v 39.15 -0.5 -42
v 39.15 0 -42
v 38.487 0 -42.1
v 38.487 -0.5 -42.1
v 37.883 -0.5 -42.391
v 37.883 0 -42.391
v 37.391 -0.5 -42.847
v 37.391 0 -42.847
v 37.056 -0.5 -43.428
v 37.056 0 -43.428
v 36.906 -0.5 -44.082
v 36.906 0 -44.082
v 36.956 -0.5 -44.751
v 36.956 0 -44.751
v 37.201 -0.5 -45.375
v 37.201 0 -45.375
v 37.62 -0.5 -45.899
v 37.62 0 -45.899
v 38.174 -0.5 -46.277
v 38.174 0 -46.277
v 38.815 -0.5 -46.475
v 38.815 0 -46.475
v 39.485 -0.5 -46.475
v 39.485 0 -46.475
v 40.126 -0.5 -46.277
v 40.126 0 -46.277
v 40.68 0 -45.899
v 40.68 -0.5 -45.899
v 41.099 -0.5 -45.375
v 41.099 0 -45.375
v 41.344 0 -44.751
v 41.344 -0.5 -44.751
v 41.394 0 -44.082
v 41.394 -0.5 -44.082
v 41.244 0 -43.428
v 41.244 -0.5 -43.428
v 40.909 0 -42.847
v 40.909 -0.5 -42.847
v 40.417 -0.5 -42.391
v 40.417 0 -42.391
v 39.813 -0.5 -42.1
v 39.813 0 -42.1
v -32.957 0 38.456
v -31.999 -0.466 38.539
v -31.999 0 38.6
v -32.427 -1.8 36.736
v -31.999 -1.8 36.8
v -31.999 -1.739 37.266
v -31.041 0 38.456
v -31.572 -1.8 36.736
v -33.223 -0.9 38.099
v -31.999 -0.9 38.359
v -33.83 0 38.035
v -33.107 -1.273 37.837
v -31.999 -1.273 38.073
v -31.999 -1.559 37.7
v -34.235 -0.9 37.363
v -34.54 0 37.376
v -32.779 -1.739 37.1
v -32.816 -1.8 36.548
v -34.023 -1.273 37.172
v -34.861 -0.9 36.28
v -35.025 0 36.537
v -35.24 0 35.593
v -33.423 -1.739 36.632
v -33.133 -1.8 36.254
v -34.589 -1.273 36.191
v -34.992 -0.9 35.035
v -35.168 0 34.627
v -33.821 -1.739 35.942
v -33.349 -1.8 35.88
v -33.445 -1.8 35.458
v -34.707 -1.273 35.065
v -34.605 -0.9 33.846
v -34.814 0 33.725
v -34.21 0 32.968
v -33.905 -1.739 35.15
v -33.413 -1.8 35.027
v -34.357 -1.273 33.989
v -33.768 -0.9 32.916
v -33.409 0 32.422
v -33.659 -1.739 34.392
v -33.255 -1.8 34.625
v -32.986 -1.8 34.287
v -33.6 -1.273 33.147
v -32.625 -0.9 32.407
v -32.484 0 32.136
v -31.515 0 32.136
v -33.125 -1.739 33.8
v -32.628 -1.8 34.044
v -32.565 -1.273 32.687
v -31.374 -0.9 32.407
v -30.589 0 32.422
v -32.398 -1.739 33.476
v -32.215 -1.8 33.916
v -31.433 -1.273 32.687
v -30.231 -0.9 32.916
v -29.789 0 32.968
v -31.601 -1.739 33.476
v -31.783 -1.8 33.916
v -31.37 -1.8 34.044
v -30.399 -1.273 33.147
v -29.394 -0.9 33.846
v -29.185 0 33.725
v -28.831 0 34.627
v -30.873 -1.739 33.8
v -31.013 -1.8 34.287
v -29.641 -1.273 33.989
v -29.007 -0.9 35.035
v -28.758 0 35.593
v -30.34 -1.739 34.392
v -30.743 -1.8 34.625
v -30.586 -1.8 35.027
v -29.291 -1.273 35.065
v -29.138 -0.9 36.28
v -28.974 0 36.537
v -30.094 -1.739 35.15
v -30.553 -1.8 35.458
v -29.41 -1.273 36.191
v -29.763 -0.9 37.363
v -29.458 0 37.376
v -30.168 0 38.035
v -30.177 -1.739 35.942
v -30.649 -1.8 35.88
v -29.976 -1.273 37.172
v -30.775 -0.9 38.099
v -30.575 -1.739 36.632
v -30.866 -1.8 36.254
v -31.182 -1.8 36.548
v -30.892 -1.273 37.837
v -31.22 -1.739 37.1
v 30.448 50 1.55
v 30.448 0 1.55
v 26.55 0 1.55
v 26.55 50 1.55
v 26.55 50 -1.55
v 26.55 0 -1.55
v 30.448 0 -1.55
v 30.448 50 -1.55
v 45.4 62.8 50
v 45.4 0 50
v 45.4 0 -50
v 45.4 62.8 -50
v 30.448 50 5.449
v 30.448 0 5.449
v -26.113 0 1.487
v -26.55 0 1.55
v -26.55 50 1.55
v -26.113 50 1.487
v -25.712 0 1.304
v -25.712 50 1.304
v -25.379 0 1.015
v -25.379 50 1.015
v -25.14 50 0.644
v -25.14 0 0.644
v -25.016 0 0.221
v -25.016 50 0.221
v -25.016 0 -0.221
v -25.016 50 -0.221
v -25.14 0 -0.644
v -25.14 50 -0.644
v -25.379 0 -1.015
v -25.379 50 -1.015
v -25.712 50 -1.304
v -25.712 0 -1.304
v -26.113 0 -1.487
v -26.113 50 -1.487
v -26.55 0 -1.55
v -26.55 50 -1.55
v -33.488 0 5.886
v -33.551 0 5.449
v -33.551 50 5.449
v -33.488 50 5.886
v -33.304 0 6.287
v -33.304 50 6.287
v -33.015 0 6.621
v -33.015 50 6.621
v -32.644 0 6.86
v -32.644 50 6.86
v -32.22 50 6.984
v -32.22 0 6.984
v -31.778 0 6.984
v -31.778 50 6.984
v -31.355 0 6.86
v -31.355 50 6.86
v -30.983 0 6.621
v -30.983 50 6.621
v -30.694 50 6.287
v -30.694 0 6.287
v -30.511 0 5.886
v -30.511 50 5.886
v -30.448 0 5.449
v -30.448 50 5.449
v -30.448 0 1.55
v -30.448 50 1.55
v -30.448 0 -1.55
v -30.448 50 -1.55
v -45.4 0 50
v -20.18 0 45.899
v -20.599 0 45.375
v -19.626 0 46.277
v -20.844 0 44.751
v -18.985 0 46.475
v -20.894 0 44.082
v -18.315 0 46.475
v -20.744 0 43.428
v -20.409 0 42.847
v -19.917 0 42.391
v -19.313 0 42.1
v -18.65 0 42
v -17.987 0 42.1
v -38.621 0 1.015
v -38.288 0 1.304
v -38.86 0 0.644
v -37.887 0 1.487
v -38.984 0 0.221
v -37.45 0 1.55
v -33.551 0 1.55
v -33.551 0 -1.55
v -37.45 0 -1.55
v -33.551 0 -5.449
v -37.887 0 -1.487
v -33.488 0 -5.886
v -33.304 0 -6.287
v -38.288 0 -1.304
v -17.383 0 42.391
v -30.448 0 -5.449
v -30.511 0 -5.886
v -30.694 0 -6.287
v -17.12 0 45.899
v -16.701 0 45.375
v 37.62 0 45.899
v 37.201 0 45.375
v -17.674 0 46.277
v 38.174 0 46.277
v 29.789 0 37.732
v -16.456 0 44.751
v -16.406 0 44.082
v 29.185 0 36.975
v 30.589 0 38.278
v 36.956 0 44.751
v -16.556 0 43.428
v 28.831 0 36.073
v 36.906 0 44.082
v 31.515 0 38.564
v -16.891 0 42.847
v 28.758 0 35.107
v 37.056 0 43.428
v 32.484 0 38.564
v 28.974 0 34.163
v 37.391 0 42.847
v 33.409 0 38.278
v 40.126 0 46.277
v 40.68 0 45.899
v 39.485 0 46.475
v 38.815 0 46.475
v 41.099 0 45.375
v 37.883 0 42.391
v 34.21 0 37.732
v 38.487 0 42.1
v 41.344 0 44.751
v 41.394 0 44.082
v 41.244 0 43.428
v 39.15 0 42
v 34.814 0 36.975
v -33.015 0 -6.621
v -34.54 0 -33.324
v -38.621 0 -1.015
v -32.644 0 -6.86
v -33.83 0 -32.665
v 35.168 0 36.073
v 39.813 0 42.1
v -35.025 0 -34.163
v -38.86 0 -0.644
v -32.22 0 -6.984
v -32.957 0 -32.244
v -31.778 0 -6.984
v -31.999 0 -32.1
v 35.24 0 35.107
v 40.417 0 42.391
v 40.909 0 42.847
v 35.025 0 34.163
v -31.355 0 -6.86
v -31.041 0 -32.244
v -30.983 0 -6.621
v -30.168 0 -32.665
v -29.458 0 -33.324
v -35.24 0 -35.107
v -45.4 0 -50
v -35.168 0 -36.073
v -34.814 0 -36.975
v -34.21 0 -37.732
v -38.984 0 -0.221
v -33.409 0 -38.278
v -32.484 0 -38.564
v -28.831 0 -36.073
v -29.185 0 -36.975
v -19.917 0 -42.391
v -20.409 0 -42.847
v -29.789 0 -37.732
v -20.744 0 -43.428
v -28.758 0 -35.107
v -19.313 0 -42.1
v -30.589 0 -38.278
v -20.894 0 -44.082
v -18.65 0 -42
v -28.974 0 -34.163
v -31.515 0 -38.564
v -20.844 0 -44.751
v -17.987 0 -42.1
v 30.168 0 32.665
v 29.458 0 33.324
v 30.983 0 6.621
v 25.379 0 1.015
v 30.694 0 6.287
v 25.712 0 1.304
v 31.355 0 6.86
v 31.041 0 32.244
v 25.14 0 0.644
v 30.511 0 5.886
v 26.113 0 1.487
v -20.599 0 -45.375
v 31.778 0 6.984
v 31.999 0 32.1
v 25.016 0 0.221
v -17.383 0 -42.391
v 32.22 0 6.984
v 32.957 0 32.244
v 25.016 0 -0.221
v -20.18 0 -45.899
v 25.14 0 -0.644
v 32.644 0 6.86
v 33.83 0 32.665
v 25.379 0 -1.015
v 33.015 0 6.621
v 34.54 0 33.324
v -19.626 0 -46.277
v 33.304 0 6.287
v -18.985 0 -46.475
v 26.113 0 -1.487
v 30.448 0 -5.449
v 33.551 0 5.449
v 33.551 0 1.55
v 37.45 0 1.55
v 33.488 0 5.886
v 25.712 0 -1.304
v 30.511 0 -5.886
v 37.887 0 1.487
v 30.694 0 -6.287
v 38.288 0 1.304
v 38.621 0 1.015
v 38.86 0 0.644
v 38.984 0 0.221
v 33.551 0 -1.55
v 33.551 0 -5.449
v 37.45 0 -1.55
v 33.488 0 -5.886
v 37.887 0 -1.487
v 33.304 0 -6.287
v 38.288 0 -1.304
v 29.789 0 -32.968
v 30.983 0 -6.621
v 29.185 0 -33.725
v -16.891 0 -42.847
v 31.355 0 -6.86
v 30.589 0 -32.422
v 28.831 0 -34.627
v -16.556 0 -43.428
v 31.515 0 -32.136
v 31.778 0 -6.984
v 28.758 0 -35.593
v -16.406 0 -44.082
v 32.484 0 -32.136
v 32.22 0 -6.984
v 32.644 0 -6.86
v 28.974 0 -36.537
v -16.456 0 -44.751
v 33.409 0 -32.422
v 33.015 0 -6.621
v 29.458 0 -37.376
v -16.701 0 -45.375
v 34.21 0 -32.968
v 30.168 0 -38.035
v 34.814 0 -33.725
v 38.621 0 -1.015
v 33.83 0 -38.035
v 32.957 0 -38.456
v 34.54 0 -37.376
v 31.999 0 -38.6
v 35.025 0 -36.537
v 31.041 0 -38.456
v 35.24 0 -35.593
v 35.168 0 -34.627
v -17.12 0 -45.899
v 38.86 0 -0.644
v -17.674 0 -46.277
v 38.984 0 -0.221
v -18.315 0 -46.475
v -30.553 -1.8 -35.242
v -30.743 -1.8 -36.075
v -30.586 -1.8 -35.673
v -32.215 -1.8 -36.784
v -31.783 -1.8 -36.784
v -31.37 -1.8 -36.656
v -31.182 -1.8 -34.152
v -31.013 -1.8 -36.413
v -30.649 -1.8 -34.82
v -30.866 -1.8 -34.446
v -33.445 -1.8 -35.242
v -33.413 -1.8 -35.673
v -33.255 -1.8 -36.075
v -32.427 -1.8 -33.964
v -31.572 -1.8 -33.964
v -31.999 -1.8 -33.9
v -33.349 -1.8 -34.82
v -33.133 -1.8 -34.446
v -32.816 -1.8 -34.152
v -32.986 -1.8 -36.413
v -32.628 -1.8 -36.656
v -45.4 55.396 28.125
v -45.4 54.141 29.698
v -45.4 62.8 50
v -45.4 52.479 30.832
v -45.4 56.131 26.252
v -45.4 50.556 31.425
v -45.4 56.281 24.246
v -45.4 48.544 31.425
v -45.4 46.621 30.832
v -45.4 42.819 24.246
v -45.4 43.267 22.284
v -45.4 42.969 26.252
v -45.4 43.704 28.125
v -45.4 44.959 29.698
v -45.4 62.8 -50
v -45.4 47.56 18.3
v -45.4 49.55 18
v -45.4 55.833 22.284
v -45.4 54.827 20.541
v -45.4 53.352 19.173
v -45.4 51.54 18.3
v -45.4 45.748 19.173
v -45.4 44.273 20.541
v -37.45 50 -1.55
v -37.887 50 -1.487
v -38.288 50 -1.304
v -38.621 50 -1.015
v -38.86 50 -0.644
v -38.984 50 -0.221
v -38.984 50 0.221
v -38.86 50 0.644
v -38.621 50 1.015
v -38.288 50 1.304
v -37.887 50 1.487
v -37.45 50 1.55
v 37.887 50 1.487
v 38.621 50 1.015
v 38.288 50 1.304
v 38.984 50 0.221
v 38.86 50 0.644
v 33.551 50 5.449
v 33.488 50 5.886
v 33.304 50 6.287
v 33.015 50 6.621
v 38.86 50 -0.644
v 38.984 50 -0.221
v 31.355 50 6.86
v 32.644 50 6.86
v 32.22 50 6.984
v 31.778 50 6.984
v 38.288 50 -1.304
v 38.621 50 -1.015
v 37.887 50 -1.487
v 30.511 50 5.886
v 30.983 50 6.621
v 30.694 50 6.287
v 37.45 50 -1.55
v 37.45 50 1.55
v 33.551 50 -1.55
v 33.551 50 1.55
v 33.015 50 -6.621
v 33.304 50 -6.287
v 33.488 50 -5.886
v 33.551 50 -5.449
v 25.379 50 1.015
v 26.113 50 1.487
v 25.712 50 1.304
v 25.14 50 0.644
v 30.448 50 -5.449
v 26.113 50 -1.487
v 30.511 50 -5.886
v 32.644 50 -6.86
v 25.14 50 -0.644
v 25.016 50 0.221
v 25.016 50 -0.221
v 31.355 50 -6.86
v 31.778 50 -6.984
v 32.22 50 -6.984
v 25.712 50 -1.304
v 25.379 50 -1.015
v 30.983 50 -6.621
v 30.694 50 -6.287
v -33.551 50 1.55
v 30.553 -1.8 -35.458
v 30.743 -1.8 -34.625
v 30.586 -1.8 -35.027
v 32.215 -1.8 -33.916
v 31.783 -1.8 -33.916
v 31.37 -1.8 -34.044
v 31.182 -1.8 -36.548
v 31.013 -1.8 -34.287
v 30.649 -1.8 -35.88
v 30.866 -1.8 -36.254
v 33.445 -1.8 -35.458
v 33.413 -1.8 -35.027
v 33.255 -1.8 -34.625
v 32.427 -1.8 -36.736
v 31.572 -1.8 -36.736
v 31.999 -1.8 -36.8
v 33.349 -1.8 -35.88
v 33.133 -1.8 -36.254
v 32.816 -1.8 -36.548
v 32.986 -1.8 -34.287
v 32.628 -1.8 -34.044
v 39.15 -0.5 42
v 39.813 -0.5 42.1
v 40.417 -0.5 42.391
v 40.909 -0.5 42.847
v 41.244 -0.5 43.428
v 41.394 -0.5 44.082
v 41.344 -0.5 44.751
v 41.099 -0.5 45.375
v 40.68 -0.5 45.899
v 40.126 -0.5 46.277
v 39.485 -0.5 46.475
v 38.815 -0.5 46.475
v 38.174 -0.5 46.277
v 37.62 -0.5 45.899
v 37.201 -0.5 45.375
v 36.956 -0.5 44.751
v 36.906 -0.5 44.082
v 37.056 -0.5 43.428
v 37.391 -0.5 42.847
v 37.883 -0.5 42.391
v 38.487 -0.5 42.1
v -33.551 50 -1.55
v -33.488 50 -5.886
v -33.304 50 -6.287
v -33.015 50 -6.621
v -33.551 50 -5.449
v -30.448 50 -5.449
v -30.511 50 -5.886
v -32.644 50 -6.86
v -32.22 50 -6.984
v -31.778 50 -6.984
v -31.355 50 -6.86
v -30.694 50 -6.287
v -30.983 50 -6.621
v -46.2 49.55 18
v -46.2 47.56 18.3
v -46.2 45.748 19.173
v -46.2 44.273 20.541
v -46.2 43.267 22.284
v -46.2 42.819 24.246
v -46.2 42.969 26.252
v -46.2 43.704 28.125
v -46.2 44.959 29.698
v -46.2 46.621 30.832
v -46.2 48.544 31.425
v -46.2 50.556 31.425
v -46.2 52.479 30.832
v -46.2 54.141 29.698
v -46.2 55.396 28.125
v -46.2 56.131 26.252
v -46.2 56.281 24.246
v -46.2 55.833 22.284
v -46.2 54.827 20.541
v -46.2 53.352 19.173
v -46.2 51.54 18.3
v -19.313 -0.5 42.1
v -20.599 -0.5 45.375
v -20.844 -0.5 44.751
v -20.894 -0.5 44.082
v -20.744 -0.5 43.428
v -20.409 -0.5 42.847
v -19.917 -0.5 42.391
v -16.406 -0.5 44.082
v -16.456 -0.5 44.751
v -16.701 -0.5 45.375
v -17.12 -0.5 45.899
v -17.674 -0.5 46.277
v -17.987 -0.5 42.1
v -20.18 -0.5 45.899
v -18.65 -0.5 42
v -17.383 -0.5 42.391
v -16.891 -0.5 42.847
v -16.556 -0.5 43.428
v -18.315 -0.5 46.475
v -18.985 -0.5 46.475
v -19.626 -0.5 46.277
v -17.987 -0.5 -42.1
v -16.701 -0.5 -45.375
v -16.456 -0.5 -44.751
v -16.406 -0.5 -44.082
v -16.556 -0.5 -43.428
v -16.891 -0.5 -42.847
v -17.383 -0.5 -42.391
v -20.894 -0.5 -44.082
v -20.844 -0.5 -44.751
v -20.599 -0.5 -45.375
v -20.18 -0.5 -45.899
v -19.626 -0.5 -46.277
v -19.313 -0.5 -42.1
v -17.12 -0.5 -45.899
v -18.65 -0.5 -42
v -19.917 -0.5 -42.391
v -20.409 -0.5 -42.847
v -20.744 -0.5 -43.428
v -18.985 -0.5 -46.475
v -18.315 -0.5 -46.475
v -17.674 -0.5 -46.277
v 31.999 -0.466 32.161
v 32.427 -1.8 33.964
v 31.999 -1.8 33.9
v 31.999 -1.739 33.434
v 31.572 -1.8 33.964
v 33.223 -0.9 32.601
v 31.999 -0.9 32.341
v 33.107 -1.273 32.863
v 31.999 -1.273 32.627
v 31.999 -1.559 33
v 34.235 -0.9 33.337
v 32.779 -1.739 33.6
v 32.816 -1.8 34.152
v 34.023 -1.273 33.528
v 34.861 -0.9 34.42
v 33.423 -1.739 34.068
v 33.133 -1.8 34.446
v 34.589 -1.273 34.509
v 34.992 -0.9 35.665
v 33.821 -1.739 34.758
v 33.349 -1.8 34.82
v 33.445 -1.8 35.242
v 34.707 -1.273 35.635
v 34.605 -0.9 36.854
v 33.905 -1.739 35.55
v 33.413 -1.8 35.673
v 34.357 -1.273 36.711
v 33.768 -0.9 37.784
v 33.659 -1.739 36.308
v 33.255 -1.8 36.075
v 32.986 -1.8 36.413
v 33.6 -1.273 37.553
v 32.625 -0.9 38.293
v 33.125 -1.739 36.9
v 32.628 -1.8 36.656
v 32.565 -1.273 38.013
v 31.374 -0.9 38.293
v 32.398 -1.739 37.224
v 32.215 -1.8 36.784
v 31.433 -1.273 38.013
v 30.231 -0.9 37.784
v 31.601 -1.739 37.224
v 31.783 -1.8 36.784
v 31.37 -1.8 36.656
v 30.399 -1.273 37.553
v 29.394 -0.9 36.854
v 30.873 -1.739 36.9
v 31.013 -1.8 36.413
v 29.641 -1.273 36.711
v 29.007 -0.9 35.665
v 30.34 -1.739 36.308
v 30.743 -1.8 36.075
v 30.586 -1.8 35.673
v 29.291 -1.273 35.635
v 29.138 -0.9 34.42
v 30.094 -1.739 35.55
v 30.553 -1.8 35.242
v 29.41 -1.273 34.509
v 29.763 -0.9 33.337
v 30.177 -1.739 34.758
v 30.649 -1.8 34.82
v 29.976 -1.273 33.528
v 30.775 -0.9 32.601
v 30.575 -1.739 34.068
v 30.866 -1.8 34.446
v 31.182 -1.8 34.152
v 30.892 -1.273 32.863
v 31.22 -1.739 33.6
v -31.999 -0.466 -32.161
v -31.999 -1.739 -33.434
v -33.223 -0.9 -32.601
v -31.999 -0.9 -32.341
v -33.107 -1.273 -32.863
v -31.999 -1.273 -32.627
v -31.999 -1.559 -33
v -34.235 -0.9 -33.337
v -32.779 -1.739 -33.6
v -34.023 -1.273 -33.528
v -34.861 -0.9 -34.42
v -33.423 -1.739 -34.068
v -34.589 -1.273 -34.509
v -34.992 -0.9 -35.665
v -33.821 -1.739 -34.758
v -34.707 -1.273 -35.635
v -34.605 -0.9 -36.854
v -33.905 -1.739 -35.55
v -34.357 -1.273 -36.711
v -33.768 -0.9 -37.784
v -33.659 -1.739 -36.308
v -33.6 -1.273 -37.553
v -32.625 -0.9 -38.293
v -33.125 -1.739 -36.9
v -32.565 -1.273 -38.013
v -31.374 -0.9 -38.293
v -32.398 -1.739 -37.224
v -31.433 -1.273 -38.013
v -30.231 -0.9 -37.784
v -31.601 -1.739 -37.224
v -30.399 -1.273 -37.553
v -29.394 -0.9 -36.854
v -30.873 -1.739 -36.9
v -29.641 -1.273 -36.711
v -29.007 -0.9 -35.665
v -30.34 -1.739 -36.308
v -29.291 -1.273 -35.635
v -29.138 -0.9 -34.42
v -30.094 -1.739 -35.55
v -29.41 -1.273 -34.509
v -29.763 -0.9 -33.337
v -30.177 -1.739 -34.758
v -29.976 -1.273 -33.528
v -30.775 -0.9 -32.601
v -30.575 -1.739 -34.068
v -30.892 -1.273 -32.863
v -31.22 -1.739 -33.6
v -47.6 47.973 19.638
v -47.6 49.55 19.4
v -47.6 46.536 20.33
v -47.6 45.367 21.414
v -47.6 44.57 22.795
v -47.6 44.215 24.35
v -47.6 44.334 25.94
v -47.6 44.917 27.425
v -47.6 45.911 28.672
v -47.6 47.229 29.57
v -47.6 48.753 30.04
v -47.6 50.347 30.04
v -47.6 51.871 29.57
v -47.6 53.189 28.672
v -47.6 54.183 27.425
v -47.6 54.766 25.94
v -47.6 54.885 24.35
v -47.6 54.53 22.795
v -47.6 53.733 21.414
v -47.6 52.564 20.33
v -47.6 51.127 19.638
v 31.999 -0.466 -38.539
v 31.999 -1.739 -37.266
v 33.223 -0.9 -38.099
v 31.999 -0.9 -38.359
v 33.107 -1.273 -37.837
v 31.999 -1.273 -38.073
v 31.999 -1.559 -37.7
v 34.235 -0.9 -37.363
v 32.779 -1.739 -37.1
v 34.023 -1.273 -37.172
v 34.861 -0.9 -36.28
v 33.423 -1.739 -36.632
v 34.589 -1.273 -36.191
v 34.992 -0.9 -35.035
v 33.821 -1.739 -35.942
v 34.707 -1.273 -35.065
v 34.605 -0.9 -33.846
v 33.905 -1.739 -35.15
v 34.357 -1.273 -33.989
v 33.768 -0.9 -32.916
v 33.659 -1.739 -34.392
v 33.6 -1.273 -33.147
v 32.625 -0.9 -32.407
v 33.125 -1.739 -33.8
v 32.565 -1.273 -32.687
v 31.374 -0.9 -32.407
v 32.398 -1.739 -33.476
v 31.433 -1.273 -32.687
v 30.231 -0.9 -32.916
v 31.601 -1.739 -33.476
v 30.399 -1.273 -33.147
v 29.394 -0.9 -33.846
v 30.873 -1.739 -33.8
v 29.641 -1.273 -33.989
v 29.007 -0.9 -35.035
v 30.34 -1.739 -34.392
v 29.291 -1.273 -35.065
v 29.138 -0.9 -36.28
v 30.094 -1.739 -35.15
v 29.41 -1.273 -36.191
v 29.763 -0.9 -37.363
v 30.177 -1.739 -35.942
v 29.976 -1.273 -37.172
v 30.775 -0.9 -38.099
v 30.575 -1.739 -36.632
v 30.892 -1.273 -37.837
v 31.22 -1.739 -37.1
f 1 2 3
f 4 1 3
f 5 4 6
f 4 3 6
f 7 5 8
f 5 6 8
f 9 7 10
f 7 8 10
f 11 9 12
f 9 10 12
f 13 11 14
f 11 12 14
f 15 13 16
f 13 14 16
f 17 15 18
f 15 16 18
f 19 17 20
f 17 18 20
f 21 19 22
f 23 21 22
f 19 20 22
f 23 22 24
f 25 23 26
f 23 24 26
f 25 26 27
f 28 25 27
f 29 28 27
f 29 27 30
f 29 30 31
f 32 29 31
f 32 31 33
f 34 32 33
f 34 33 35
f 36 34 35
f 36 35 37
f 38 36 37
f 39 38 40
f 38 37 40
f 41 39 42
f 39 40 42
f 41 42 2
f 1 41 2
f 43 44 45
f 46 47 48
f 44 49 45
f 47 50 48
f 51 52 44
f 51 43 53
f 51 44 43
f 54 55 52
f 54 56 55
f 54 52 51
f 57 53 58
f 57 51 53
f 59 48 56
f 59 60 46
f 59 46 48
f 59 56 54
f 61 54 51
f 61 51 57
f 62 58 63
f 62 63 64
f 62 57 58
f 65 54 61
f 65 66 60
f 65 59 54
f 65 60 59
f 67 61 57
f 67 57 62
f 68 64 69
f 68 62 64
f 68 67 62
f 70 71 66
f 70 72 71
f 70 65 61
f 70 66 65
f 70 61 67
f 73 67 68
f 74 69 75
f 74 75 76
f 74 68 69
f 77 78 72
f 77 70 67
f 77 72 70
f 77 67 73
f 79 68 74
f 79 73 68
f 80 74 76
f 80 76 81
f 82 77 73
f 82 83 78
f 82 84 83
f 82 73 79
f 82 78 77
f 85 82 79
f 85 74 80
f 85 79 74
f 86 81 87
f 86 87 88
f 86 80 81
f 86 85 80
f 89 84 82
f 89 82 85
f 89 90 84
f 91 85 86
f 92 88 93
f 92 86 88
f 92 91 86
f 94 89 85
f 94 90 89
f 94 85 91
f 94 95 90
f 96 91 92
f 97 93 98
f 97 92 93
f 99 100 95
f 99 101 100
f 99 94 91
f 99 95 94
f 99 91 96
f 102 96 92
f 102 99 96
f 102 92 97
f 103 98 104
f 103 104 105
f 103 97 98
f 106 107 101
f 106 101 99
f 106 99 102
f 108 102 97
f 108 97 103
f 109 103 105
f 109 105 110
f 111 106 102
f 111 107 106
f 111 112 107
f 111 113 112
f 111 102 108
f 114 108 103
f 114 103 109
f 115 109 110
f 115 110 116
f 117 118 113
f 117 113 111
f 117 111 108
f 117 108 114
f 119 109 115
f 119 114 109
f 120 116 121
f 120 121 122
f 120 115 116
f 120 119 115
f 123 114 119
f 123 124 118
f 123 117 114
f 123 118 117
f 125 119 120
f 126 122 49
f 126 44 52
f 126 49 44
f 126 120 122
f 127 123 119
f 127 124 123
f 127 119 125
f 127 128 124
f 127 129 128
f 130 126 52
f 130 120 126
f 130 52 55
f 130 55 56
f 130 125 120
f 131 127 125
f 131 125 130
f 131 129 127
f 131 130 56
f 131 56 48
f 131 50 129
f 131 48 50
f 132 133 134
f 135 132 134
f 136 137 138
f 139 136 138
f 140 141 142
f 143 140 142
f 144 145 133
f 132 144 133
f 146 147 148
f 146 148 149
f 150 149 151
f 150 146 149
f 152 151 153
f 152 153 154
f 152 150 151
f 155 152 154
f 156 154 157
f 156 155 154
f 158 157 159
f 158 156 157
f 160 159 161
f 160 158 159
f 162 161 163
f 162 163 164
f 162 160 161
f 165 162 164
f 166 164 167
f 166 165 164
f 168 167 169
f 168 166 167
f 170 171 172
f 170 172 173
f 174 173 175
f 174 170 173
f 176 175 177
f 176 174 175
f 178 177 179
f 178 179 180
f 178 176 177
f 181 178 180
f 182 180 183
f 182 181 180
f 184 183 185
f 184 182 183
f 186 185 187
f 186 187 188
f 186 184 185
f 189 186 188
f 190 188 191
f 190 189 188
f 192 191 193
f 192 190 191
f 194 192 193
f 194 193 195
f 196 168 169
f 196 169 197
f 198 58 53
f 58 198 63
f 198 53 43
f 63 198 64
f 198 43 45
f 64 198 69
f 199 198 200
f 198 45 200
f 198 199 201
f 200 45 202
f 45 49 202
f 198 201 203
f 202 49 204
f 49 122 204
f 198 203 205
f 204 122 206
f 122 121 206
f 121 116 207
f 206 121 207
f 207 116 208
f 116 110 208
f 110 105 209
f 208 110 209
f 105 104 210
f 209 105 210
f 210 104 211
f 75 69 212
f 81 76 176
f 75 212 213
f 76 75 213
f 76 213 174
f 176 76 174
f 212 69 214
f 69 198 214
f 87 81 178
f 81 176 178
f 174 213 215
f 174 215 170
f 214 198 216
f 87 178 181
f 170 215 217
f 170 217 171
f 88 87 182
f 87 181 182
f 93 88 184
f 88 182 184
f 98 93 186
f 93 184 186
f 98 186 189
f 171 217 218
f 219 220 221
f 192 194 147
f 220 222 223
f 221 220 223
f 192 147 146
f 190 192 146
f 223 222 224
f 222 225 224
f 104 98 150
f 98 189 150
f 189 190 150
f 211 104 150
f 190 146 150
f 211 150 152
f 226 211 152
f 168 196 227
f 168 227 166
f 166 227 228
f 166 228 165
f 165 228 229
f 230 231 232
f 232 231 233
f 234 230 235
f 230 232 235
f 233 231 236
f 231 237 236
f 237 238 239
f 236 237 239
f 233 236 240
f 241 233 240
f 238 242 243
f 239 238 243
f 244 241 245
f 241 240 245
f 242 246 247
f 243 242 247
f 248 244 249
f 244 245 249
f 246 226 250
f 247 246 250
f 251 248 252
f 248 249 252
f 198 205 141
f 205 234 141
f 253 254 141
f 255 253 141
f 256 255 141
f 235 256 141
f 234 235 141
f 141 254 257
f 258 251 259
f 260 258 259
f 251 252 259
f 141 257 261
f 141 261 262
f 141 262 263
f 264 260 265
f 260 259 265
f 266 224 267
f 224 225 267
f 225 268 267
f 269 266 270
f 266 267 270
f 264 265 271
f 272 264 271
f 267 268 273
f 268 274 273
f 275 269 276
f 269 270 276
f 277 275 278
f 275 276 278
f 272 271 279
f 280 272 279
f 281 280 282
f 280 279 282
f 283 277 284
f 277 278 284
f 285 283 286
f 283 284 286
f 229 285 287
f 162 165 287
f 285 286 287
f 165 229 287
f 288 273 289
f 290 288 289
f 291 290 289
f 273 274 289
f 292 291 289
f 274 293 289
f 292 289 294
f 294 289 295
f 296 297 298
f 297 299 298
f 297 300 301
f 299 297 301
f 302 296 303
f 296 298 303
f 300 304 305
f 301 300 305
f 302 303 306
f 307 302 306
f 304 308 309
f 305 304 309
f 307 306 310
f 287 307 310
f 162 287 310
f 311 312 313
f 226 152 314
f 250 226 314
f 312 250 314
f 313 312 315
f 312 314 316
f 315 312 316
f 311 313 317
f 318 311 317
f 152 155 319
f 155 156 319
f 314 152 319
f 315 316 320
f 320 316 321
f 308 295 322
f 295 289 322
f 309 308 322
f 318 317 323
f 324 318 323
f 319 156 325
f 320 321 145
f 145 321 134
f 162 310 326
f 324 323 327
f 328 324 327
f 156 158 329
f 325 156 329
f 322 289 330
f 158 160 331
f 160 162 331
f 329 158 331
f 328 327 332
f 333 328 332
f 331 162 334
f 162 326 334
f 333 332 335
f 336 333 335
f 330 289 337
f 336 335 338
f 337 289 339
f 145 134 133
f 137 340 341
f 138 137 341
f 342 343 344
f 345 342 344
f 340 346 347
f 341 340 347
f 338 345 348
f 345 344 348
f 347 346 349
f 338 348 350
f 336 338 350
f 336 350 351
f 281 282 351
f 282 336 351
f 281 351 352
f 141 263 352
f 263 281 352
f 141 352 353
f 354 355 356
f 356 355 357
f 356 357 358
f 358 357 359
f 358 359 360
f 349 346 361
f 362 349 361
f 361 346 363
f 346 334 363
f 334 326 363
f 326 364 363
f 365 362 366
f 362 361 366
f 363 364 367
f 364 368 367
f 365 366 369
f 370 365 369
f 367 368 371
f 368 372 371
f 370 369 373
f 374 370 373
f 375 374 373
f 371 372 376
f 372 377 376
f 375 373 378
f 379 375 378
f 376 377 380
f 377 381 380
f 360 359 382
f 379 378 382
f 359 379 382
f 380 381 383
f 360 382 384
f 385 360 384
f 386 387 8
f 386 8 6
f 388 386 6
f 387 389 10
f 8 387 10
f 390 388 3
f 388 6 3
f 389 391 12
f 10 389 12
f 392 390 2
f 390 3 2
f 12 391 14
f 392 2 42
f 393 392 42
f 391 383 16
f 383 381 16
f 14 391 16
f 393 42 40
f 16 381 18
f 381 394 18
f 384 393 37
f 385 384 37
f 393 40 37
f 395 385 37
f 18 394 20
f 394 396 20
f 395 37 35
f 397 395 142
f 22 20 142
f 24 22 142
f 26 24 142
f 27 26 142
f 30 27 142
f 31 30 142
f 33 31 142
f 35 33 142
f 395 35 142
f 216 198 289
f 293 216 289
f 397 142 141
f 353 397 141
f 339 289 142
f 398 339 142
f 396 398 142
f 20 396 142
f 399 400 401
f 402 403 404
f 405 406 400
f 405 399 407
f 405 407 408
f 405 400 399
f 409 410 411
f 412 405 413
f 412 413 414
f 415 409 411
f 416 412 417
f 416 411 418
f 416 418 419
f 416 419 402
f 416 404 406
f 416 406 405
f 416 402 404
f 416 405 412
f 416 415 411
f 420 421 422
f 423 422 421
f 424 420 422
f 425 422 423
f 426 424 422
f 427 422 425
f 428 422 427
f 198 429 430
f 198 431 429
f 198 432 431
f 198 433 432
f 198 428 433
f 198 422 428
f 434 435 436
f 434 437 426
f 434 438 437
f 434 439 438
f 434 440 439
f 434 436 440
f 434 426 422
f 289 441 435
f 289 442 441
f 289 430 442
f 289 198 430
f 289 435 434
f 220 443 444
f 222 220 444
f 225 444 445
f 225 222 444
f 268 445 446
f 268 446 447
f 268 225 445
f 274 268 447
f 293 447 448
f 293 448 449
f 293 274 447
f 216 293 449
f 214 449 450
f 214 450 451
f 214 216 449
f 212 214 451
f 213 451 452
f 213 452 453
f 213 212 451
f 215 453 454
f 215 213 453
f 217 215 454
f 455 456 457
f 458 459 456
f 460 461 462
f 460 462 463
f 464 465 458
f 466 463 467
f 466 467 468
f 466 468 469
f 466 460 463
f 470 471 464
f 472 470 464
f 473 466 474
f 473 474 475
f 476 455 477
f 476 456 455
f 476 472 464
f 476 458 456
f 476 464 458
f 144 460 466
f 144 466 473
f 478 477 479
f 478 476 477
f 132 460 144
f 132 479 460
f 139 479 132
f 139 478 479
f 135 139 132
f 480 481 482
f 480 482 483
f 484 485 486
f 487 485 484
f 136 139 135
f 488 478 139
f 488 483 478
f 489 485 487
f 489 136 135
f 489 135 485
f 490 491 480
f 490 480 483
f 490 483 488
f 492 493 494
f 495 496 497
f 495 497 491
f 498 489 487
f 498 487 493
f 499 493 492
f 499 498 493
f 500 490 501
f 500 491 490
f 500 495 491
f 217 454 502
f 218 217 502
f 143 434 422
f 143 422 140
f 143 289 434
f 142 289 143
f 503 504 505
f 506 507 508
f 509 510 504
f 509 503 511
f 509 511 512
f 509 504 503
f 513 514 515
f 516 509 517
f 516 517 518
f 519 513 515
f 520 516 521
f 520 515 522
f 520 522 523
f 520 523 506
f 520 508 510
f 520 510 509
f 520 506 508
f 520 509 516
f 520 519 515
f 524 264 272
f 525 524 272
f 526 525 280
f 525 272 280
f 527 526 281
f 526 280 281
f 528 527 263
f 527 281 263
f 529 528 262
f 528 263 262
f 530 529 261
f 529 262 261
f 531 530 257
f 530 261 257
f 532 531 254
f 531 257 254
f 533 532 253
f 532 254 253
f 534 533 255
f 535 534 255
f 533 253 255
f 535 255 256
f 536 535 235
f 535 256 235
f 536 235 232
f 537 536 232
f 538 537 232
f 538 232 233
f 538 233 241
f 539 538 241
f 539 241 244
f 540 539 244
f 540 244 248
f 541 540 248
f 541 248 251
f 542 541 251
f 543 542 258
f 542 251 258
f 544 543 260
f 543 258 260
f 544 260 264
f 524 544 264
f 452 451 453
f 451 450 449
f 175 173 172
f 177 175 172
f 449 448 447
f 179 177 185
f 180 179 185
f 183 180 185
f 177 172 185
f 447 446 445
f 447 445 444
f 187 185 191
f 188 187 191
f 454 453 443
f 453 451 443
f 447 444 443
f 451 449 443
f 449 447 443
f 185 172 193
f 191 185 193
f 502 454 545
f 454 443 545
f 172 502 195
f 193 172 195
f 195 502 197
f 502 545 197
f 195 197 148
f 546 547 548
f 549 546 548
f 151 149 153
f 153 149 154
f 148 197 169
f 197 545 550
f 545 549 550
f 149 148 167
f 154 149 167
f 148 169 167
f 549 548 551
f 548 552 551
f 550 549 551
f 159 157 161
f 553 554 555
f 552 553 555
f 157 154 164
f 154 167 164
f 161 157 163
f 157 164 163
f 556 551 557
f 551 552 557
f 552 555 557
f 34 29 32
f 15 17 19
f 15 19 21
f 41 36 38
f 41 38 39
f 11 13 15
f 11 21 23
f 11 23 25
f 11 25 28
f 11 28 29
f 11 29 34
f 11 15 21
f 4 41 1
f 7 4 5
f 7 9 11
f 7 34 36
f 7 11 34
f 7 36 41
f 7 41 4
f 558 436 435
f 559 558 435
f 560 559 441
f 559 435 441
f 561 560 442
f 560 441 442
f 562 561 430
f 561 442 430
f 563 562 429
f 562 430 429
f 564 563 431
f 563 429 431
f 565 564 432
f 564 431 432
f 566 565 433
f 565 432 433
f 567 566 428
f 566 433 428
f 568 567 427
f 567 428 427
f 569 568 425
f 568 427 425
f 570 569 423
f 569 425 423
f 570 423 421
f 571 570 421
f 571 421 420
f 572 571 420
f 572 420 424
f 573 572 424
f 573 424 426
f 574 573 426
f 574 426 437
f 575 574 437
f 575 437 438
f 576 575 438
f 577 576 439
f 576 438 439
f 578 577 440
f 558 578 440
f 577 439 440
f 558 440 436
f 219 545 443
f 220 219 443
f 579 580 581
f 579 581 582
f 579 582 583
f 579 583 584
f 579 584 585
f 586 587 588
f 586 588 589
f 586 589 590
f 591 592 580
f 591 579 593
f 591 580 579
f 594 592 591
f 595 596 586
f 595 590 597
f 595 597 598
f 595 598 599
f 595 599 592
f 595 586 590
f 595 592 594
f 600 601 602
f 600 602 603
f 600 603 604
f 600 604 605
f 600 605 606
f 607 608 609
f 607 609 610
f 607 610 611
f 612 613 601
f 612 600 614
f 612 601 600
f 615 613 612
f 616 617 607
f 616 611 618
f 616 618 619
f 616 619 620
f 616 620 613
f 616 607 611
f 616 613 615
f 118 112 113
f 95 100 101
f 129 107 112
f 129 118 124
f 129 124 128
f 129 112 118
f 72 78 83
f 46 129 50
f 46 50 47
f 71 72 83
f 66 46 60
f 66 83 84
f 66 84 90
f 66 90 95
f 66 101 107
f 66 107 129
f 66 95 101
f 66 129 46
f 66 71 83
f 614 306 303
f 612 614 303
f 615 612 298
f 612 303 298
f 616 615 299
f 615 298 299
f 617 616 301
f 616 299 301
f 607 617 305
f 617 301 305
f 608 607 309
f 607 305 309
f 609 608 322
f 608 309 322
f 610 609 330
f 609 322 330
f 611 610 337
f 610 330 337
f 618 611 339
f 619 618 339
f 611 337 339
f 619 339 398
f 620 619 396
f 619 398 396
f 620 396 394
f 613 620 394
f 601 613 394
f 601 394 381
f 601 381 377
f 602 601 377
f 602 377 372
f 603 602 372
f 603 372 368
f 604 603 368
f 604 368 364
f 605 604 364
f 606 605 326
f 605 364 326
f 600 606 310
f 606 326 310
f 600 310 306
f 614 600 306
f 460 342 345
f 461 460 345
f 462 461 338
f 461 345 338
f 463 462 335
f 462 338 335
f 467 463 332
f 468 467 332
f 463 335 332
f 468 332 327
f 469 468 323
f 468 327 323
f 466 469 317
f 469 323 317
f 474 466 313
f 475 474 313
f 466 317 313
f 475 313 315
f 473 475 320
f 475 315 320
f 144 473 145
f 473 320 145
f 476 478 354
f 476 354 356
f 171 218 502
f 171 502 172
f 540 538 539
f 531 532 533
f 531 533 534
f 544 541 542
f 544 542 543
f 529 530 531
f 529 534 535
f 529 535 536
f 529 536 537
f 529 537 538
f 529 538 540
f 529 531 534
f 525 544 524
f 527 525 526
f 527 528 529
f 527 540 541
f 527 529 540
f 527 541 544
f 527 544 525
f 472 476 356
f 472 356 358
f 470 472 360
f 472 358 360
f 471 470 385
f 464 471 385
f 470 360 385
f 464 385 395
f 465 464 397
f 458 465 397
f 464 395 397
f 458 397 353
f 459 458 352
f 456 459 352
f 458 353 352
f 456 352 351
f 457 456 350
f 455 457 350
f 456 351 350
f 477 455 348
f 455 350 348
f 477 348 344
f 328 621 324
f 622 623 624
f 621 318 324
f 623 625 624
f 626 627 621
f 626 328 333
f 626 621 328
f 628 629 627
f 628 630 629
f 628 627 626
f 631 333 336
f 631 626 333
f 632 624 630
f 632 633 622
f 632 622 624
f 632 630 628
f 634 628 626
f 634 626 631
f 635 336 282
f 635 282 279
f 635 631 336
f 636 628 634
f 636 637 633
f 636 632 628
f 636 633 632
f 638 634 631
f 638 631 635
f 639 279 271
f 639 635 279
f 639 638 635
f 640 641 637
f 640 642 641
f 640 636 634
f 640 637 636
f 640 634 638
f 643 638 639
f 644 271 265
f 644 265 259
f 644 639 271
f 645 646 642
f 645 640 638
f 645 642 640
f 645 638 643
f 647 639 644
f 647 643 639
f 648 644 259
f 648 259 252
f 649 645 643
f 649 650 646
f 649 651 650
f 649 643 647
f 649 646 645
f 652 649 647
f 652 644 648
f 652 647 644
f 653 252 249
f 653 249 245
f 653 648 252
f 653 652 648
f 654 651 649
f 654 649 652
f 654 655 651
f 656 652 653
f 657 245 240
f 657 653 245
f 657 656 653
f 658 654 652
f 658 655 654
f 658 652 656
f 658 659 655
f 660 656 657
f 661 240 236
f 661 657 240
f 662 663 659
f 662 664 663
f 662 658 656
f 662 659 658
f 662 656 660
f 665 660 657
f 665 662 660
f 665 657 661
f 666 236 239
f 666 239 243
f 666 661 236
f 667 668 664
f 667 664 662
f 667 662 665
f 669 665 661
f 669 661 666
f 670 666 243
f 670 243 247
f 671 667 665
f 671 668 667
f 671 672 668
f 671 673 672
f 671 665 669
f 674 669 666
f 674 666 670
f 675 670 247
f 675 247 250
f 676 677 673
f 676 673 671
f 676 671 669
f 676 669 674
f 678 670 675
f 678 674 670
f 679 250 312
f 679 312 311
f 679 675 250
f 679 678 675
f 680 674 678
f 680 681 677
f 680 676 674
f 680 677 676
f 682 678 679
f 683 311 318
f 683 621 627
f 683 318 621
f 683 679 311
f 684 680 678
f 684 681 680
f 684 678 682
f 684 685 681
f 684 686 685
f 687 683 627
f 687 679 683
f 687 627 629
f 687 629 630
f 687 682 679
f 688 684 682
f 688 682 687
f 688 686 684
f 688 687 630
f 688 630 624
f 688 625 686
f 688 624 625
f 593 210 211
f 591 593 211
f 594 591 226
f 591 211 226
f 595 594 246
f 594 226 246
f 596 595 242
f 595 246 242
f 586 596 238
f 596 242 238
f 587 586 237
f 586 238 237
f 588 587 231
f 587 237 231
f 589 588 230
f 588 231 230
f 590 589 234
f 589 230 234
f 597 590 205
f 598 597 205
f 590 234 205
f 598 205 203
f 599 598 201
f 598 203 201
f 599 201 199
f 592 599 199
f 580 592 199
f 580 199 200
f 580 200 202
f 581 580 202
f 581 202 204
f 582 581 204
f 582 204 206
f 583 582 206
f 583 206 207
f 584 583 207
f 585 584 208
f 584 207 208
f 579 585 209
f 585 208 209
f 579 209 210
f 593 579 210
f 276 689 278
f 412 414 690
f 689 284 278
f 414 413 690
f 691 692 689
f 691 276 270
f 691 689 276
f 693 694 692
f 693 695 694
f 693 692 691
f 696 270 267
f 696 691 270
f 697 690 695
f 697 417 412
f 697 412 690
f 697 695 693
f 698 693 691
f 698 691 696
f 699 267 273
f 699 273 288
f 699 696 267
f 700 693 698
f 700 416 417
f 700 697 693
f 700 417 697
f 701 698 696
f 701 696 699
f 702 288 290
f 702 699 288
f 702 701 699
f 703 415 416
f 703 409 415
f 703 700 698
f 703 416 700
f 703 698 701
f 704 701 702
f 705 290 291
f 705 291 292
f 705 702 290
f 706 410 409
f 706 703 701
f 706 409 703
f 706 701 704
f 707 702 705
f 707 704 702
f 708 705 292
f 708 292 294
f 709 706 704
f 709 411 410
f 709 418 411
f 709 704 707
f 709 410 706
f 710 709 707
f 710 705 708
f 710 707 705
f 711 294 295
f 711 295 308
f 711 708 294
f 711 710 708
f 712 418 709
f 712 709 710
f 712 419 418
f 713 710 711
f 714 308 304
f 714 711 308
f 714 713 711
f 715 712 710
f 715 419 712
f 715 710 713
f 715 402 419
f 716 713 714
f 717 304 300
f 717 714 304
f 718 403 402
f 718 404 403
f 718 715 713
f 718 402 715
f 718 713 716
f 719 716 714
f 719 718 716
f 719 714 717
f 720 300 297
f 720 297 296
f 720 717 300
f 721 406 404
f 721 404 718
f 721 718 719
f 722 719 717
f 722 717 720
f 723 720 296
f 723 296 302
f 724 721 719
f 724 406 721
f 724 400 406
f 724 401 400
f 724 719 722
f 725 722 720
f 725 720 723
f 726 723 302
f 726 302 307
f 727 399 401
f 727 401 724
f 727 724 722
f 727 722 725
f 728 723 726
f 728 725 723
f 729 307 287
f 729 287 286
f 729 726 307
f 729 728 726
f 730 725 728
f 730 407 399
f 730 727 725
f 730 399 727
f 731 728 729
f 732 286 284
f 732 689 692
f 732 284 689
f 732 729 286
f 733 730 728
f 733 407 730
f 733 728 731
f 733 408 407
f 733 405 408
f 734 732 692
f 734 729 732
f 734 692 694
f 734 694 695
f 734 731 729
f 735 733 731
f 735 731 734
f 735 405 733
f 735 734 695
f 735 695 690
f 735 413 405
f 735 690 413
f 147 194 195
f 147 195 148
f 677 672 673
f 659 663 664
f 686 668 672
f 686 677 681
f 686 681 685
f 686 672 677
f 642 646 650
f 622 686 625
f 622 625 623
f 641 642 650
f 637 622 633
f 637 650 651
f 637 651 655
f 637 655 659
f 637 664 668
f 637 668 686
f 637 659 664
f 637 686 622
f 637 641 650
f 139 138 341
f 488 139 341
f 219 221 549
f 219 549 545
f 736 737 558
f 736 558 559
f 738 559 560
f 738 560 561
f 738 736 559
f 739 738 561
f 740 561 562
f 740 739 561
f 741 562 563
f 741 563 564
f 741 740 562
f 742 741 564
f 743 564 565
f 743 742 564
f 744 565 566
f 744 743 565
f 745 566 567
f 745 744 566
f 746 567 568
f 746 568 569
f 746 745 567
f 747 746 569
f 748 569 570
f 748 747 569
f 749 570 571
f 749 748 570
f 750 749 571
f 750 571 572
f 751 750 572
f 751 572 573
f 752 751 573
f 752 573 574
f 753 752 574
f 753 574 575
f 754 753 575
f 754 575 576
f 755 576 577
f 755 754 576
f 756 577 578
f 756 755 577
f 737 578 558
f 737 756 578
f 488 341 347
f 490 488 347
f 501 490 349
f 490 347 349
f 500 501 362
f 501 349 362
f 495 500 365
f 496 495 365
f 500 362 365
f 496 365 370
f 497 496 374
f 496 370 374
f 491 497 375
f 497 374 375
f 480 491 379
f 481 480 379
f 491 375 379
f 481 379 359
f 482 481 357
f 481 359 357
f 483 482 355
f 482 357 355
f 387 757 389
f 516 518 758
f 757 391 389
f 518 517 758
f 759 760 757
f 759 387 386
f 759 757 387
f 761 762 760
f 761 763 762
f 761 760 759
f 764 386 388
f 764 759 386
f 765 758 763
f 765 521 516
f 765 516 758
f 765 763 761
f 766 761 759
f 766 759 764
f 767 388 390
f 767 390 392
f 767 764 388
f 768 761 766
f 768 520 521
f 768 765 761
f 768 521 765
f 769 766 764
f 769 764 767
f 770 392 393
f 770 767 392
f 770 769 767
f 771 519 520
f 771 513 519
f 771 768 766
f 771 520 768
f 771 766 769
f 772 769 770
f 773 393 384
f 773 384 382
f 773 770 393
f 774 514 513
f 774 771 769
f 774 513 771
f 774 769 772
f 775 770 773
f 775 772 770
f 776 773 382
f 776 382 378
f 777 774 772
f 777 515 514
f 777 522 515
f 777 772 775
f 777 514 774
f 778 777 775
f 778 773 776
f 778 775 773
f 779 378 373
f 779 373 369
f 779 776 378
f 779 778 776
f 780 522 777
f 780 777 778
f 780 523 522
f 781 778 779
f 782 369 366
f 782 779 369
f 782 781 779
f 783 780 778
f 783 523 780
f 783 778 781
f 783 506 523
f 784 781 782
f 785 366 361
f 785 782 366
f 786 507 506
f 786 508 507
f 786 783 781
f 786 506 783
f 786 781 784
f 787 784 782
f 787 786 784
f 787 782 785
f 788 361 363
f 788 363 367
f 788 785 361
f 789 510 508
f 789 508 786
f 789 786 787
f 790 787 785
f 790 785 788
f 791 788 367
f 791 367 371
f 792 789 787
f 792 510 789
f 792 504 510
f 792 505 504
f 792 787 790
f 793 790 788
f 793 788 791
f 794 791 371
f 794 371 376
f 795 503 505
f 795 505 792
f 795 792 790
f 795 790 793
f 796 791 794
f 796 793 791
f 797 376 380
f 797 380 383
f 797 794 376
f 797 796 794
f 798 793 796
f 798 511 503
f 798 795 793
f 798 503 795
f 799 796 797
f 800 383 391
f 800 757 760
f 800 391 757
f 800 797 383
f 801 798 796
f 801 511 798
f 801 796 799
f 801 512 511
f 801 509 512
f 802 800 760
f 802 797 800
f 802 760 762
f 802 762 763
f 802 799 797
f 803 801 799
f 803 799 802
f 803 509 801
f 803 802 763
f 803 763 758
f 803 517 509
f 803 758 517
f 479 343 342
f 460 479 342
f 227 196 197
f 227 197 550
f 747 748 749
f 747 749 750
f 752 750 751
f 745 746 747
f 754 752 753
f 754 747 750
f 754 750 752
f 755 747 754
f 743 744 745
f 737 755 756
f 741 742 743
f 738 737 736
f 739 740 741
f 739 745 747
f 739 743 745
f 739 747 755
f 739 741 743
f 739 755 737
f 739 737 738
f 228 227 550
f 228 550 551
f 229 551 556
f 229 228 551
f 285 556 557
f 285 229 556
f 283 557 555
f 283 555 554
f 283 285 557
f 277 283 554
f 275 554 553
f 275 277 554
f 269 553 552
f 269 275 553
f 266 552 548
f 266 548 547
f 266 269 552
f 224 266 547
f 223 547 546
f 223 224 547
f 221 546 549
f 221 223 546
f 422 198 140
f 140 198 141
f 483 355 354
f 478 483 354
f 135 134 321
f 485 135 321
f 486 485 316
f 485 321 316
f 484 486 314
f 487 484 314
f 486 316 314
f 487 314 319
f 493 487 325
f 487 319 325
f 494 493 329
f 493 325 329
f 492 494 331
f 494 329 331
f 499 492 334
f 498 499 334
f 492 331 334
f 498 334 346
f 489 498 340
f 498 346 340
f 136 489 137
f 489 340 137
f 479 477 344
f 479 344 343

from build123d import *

# Parameters (mm, degrees)
SKETCH1_W           = 90.8
SKETCH1_H           = 100
BOSS_EXTRUDE1_DEPTH = 62.8
CUT_EXTRUDE2_DEPTH  = 50
SKETCH3_R           = 3.25
BOSS_EXTRUDE2_DEPTH = 1.8
FILLET3_R           = 1.8
SKETCH4_R           = 2.25
BOSS_EXTRUDE3_DEPTH = 0.5
SKETCH6_R           = 6.75
BOSS_EXTRUDE4_DEPTH = 2.2
CHAMFER2_SIZE       = 1.4


with BuildPart() as part:
    # Sketch1 → Boss-Extrude1 (new body)
    with BuildSketch(Plane(origin=(0, 0, 0), x_dir=(1, 0, 0), z_dir=(0, 1, 0))):
        Rectangle(SKETCH1_W, SKETCH1_H)
    extrude(amount=BOSS_EXTRUDE1_DEPTH)

    # Sketch2 → Cut-Extrude2 (cut)
    with BuildSketch(Plane(origin=(0, 0, 0), x_dir=(-1, 0, 0), z_dir=(0, -1, 0))):
        with BuildLine():
            Line((33.550736089, -1.55), (33.550736089, -5.448527997))
            ThreePointArc((33.550736089, -5.448527997), (31.999263911, -7.000000175), (30.447791734, -5.448527997))
            Line((30.447791734, -5.448527997), (30.447791734, -1.55))
            Line((30.447791734, -1.55), (26.55, -1.55))
            ThreePointArc((26.55, -1.55), (25, 0), (26.55, 1.55))
            Line((26.55, 1.55), (30.447791734, 1.55))
            Line((30.447791734, 1.55), (30.447791734, 5.448527997))
            ThreePointArc((30.447791734, 5.448527997), (31.999263911, 7.000000175), (33.550736089, 5.448527997))
            Line((33.550736089, 5.448527997), (33.550736089, 1.55))
            Line((33.550736089, 1.55), (37.45, 1.55))
            ThreePointArc((37.45, 1.55), (39, 0), (37.45, -1.55))
            Line((37.45, -1.55), (33.550736089, -1.55))
        make_face()
        with BuildLine():
            Line((-30.447791734, 1.55), (-30.447791734, 5.448527997))
            ThreePointArc((-30.447791734, 5.448527997), (-31.999263911, 7.000000175), (-33.550736089, 5.448527997))
            Line((-33.550736089, 5.448527997), (-33.550736089, 1.55))
            Line((-33.550736089, 1.55), (-37.45, 1.55))
            ThreePointArc((-37.45, 1.55), (-39, 0), (-37.45, -1.55))
            Line((-37.45, -1.55), (-33.550736089, -1.55))
            Line((-33.550736089, -1.55), (-33.550736089, -5.448527997))
            ThreePointArc((-33.550736089, -5.448527997), (-31.999263911, -7.000000175), (-30.447791734, -5.448527997))
            Line((-30.447791734, -5.448527997), (-30.447791734, -1.55))
            Line((-30.447791734, -1.55), (-26.55, -1.55))
            ThreePointArc((-26.55, -1.55), (-25, 0), (-26.55, 1.55))
            Line((-26.55, 1.55), (-30.447791734, 1.55))
        make_face()
    extrude(amount=-CUT_EXTRUDE2_DEPTH, mode=Mode.SUBTRACT)

    # Sketch3 → Boss-Extrude2 (add)
    with BuildSketch(Plane.XZ):
        with Locations(Location((31.999263911, 35.350000175, 0), (0, 0, 270))):
            Circle(SKETCH3_R)
        with Locations(Location((31.999263911, -35.350000175, 0), (0, 0, 270))):
            Circle(SKETCH3_R)
        with Locations(Location((-31.999263911, -35.350000175, 0), (0, 0, 90))):
            Circle(SKETCH3_R)
        with Locations(Location((-31.999263911, 35.350000175, 0), (0, 0, 90))):
            Circle(SKETCH3_R)
    extrude(amount=BOSS_EXTRUDE2_DEPTH)

    # Fillet3
    fillet3_edges = [part.edges().sort_by_distance(p)[0] for p in [
        (-31.999263911, -1.8, 32.100000175),
        (31.999263911, -1.8, -32.100000175),
        (31.999263911, -1.8, 38.600000175),
        (-31.999263911, -1.8, -38.600000175),
    ]]
    fillet(fillet3_edges, radius=FILLET3_R - 0.0001)  # a hair under: the kernel refuses the full size

    # Sketch4 → Boss-Extrude3 (add)
    with BuildSketch(Plane(origin=(0, 0, 0), x_dir=(-1, 0, 0), z_dir=(0, -1, 0))):
        with Locations(Location((18.65, -44.25, 0), (0, 0, 90))):
            Circle(SKETCH4_R)
        with Locations(Location((-39.15, -44.25, 0), (0, 0, 90))):
            Circle(SKETCH4_R)
        with Locations(Location((-39.15, 44.25, 0), (0, 0, 270))):
            Circle(SKETCH4_R)
        with Locations(Location((18.65, 44.25, 0), (0, 0, 270))):
            Circle(SKETCH4_R)
    extrude(amount=BOSS_EXTRUDE3_DEPTH)

    # Sketch6 → Boss-Extrude4 (add)
    with BuildSketch(Plane.ZY.offset(45.4)):
        with Locations(Location((24.75, 49.55, 0), (0, 0, 180))):
            Circle(SKETCH6_R)
    extrude(amount=BOSS_EXTRUDE4_DEPTH)

    # Chamfer2
    chamfer2_edges = [part.edges().sort_by_distance(p)[0] for p in [
        (-47.6, 49.55, 31.5),
    ]]
    chamfer(chamfer2_edges, length=CHAMFER2_SIZE)


solid = part.part
